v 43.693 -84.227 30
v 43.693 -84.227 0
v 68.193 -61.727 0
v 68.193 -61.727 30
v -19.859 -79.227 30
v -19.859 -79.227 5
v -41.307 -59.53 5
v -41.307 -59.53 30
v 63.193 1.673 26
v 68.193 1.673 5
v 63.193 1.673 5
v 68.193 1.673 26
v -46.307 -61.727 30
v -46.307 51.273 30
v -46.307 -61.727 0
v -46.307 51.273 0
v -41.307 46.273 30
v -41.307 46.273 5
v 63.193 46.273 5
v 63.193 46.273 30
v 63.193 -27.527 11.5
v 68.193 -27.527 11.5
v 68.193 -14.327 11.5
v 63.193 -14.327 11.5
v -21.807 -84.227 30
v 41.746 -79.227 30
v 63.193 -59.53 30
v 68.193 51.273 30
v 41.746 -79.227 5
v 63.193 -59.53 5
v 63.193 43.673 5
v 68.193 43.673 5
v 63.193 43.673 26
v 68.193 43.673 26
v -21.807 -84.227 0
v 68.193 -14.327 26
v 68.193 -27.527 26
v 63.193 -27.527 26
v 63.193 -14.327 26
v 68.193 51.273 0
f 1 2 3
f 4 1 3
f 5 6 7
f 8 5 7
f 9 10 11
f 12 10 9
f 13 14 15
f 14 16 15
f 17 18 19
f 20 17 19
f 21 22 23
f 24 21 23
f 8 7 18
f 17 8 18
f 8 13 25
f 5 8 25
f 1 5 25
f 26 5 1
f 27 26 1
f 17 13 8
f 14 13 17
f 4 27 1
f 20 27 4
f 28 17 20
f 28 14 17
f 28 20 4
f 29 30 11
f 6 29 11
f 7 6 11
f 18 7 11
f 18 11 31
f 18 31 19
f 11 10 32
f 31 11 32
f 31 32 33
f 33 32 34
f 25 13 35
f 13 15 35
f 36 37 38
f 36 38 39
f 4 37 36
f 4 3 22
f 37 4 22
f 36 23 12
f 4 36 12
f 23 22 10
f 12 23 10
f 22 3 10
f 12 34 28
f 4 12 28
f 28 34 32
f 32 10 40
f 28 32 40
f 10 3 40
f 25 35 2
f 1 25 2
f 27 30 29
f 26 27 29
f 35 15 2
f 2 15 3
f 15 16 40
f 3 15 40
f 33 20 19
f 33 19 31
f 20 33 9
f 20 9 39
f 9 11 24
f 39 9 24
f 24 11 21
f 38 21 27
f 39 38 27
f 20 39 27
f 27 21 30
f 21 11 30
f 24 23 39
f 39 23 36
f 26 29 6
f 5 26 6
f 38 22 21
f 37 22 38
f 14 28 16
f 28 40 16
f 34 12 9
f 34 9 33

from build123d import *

# Parameters (mm, degrees)
F1_DEPTH = 5
F3_DEPTH = 25
F5_W     = 13.2
F5_H     = 14.5
F5_W_2   = 42
F5_H_2   = 21
F6_DEPTH = 5


with BuildPart() as f1:
    # F0 (on Top) → F1 (new body)
    with BuildSketch(Plane.XY):
        Polygon((68.193161, 51.273486), (-46.306839, 51.273486), (-46.306839, -61.726514), (-21.806839, -84.226514), (43.693161, -84.226514), (68.193161, -61.726514), align=None)
    extrude(amount=F1_DEPTH)

    # F2 (on face) → F3 (join)
    with BuildSketch(Plane.XY.offset(5)):
        Polygon((68.193161, -61.726514), (68.193161, 51.273486), (-46.306839, 51.273486), (-46.306839, -61.726514), (-21.806839, -84.226514), (43.693161, -84.226514), align=None)
        Polygon((-19.859262, -79.226514), (-41.306839, -59.52976), (-41.306839, 46.273486), (63.193161, 46.273486), (63.193161, -59.52976), (41.745585, -79.226514), align=None, mode=Mode.SUBTRACT)
    extrude(amount=F3_DEPTH)

    # F5 (on face) → F6 (cut, through all)
    with BuildSketch(Plane.YZ.offset(68.193161)):
        with Locations((-20.926514, 18.75)):
            Rectangle(F5_W, F5_H)
        with Locations((22.673486, 15.5)):
            Rectangle(F5_W_2, F5_H_2)
    extrude(amount=-F6_DEPTH, mode=Mode.SUBTRACT)


solid = f1.part
